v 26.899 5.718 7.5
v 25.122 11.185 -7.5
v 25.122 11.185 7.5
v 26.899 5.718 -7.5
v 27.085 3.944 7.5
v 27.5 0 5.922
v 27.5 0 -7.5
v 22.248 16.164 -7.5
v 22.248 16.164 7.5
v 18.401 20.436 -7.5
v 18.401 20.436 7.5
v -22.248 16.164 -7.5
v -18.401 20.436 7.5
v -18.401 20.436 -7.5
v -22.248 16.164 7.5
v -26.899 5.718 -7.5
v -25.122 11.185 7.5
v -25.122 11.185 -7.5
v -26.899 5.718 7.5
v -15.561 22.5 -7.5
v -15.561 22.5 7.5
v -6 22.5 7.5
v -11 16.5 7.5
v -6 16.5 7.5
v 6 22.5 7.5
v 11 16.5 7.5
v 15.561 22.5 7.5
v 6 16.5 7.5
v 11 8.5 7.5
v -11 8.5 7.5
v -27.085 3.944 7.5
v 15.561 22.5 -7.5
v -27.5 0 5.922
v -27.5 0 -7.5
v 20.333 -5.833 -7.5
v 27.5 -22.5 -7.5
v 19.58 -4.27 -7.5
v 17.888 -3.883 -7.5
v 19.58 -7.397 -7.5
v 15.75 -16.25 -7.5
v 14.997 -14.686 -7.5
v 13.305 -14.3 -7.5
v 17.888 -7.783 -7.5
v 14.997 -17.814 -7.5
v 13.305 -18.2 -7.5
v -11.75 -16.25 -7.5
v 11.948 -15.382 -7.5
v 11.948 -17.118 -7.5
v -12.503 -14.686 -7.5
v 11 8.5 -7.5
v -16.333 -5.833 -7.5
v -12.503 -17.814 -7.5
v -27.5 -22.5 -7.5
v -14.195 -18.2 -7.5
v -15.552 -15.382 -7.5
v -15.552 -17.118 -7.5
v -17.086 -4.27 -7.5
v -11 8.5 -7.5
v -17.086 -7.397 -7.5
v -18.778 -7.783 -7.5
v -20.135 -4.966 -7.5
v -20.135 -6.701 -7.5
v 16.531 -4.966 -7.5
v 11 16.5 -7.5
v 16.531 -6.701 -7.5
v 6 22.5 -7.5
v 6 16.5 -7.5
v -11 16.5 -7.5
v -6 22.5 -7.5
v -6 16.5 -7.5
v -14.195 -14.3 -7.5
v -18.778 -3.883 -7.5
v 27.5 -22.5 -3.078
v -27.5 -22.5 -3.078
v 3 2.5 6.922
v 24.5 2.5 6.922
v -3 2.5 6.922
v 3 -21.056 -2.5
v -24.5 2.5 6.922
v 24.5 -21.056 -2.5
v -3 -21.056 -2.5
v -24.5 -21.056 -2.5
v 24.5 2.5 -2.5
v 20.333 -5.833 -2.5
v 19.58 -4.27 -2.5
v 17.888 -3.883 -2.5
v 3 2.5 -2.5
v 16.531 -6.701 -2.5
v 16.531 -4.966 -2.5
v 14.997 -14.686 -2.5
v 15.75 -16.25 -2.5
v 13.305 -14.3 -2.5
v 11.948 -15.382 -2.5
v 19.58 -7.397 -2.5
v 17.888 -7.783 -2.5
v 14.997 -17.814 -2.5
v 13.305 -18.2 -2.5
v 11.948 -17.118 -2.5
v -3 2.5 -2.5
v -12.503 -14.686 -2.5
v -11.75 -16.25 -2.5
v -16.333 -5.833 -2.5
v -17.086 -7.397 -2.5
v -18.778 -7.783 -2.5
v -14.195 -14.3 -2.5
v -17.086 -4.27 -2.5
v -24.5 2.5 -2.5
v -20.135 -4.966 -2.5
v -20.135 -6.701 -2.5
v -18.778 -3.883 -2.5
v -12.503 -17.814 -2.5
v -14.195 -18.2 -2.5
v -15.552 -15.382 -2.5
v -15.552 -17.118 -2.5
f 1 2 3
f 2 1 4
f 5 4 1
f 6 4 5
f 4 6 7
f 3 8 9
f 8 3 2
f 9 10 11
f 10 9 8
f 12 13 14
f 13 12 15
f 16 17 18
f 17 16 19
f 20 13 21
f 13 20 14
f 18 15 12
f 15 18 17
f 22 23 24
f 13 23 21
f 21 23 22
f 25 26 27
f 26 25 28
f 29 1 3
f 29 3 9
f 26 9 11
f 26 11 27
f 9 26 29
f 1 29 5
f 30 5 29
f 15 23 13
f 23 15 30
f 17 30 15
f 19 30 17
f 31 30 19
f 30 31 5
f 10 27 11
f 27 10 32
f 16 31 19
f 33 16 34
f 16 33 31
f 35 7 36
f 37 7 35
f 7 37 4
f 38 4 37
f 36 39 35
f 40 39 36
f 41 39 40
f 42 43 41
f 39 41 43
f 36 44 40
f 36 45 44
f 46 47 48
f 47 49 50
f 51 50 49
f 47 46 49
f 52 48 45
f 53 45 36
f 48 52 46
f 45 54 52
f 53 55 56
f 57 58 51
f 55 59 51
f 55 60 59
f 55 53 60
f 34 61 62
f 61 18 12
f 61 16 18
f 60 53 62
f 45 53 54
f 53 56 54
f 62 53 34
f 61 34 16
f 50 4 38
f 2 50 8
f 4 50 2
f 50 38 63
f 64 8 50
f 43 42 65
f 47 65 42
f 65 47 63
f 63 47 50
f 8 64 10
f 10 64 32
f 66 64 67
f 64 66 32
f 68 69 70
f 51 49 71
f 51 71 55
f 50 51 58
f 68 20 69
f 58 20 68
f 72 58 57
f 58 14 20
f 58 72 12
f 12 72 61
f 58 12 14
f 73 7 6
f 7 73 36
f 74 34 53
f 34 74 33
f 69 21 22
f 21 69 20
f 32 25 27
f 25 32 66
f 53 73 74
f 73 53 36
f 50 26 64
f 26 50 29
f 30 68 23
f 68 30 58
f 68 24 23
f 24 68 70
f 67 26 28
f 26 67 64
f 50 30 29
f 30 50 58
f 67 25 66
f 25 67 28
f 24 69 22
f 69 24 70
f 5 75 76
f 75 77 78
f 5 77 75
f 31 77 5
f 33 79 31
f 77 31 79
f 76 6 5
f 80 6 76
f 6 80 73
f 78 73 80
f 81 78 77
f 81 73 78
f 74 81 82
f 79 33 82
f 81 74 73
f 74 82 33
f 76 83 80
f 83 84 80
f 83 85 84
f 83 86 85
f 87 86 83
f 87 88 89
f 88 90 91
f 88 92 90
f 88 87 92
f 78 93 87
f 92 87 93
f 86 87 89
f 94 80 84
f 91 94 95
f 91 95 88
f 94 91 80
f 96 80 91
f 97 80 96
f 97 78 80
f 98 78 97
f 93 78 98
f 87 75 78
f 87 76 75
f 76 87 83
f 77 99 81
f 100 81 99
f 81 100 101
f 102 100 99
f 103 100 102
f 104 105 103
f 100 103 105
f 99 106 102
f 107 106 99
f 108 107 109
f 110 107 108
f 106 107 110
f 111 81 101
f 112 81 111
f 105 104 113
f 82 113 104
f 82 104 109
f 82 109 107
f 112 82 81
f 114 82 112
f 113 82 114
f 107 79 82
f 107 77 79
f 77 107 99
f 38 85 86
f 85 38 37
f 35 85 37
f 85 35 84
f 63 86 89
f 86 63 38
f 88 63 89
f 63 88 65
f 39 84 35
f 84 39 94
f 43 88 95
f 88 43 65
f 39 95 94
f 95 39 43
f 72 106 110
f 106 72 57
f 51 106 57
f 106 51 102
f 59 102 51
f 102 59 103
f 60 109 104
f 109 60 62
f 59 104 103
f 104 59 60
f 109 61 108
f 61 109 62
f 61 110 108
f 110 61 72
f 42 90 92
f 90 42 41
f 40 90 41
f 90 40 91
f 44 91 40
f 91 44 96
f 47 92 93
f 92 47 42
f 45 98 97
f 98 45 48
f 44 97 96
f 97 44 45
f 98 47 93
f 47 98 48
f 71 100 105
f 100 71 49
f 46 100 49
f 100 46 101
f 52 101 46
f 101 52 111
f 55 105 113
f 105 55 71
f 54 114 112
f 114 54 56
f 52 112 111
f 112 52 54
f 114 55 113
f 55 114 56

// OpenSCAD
//********************************************************************
// Customizable Drawer Guide Bracket 
// By James Newton
//********************************************************************


//********************************************************************
//User defined parameters
//********************************************************************
//Width of guide.
guideWidth = 22;

//Height of guide.
guideHeight = 8;

//Distance between guide and ceiling of drawer slot
guideClearance = 6;

//Width of the guide mount or space between the top "fingers" of the bracket.
guideMount = 12;

//Width of Bracket (must be wider than guide)
bracketWidth = 55; 

bracketHeight = 45;

bracketDepth = 15;

bracketThickness = 5;

screwDiameter = 4;

//********************************************************************
bracketBelowShelf=(bracketHeight-guideClearance*2-guideHeight);
intersection() {

	// Remove extra material from the "fingers" at the top.
	union() {
		cylinder(h=bracketDepth,r=bracketWidth/2,center=true);
		//but don't take anything off the bottom. 
		translate([0,-bracketHeight/2,0])
			cube([bracketWidth,bracketHeight,bracketDepth], center=true);
		}
	
	difference() {
		//base plate
		cube([bracketWidth,bracketHeight,bracketDepth], center=true);
		
		// cutout for guide
		translate([0,bracketHeight/2-guideClearance-guideHeight/2,0])
			cube([guideWidth,guideHeight,bracketDepth*2], center=true);
	
		// cutout for guide mount
		translate([0,bracketHeight/2-guideClearance/2,0])
			cube([guideMount,guideClearance+1,bracketDepth*2], center=true);
	
		// slope the attachment to the guide holder
		translate([0,-bracketHeight/2,bracketThickness]) 
		rotate([atan((bracketDepth-bracketThickness)/bracketBelowShelf),0,0])
			cube([bracketWidth+1,bracketHeight*2,bracketDepth], center=true);
	
		// Remove unneeded material from the attachment, leaving center and side buttresses
		translate([guideClearance/2,-bracketHeight/2,-bracketDepth/2+bracketThickness]) 
			cube([bracketWidth/2-guideClearance, bracketBelowShelf, bracketDepth]);
		translate([-bracketWidth/2+guideClearance/2,-bracketHeight/2,-bracketDepth/2+bracketThickness]) 
			cube([bracketWidth/2-guideClearance, bracketBelowShelf, bracketDepth]);
	
		// Screw holes
		translate([bracketWidth*2/6,-(bracketHeight/2)+(bracketBelowShelf*2/3),0]) 
			cylinder(h=bracketDepth+1,r=screwDiameter/2,center=true);
		translate([-bracketWidth*2/6,-(bracketHeight/2)+(bracketBelowShelf*2/3),0]) 
			cylinder(h=bracketDepth+1,r=screwDiameter/2,center=true);
		translate([bracketWidth*1/4,-(bracketHeight/2)+(bracketBelowShelf*1/4),0]) 
			cylinder(h=bracketDepth+1,r=screwDiameter/2,center=true);
		translate([-bracketWidth*1/4,-(bracketHeight/2)+(bracketBelowShelf*1/4),0]) 
			cylinder(h=bracketDepth+1,r=screwDiameter/2,center=true);
		}
	}
